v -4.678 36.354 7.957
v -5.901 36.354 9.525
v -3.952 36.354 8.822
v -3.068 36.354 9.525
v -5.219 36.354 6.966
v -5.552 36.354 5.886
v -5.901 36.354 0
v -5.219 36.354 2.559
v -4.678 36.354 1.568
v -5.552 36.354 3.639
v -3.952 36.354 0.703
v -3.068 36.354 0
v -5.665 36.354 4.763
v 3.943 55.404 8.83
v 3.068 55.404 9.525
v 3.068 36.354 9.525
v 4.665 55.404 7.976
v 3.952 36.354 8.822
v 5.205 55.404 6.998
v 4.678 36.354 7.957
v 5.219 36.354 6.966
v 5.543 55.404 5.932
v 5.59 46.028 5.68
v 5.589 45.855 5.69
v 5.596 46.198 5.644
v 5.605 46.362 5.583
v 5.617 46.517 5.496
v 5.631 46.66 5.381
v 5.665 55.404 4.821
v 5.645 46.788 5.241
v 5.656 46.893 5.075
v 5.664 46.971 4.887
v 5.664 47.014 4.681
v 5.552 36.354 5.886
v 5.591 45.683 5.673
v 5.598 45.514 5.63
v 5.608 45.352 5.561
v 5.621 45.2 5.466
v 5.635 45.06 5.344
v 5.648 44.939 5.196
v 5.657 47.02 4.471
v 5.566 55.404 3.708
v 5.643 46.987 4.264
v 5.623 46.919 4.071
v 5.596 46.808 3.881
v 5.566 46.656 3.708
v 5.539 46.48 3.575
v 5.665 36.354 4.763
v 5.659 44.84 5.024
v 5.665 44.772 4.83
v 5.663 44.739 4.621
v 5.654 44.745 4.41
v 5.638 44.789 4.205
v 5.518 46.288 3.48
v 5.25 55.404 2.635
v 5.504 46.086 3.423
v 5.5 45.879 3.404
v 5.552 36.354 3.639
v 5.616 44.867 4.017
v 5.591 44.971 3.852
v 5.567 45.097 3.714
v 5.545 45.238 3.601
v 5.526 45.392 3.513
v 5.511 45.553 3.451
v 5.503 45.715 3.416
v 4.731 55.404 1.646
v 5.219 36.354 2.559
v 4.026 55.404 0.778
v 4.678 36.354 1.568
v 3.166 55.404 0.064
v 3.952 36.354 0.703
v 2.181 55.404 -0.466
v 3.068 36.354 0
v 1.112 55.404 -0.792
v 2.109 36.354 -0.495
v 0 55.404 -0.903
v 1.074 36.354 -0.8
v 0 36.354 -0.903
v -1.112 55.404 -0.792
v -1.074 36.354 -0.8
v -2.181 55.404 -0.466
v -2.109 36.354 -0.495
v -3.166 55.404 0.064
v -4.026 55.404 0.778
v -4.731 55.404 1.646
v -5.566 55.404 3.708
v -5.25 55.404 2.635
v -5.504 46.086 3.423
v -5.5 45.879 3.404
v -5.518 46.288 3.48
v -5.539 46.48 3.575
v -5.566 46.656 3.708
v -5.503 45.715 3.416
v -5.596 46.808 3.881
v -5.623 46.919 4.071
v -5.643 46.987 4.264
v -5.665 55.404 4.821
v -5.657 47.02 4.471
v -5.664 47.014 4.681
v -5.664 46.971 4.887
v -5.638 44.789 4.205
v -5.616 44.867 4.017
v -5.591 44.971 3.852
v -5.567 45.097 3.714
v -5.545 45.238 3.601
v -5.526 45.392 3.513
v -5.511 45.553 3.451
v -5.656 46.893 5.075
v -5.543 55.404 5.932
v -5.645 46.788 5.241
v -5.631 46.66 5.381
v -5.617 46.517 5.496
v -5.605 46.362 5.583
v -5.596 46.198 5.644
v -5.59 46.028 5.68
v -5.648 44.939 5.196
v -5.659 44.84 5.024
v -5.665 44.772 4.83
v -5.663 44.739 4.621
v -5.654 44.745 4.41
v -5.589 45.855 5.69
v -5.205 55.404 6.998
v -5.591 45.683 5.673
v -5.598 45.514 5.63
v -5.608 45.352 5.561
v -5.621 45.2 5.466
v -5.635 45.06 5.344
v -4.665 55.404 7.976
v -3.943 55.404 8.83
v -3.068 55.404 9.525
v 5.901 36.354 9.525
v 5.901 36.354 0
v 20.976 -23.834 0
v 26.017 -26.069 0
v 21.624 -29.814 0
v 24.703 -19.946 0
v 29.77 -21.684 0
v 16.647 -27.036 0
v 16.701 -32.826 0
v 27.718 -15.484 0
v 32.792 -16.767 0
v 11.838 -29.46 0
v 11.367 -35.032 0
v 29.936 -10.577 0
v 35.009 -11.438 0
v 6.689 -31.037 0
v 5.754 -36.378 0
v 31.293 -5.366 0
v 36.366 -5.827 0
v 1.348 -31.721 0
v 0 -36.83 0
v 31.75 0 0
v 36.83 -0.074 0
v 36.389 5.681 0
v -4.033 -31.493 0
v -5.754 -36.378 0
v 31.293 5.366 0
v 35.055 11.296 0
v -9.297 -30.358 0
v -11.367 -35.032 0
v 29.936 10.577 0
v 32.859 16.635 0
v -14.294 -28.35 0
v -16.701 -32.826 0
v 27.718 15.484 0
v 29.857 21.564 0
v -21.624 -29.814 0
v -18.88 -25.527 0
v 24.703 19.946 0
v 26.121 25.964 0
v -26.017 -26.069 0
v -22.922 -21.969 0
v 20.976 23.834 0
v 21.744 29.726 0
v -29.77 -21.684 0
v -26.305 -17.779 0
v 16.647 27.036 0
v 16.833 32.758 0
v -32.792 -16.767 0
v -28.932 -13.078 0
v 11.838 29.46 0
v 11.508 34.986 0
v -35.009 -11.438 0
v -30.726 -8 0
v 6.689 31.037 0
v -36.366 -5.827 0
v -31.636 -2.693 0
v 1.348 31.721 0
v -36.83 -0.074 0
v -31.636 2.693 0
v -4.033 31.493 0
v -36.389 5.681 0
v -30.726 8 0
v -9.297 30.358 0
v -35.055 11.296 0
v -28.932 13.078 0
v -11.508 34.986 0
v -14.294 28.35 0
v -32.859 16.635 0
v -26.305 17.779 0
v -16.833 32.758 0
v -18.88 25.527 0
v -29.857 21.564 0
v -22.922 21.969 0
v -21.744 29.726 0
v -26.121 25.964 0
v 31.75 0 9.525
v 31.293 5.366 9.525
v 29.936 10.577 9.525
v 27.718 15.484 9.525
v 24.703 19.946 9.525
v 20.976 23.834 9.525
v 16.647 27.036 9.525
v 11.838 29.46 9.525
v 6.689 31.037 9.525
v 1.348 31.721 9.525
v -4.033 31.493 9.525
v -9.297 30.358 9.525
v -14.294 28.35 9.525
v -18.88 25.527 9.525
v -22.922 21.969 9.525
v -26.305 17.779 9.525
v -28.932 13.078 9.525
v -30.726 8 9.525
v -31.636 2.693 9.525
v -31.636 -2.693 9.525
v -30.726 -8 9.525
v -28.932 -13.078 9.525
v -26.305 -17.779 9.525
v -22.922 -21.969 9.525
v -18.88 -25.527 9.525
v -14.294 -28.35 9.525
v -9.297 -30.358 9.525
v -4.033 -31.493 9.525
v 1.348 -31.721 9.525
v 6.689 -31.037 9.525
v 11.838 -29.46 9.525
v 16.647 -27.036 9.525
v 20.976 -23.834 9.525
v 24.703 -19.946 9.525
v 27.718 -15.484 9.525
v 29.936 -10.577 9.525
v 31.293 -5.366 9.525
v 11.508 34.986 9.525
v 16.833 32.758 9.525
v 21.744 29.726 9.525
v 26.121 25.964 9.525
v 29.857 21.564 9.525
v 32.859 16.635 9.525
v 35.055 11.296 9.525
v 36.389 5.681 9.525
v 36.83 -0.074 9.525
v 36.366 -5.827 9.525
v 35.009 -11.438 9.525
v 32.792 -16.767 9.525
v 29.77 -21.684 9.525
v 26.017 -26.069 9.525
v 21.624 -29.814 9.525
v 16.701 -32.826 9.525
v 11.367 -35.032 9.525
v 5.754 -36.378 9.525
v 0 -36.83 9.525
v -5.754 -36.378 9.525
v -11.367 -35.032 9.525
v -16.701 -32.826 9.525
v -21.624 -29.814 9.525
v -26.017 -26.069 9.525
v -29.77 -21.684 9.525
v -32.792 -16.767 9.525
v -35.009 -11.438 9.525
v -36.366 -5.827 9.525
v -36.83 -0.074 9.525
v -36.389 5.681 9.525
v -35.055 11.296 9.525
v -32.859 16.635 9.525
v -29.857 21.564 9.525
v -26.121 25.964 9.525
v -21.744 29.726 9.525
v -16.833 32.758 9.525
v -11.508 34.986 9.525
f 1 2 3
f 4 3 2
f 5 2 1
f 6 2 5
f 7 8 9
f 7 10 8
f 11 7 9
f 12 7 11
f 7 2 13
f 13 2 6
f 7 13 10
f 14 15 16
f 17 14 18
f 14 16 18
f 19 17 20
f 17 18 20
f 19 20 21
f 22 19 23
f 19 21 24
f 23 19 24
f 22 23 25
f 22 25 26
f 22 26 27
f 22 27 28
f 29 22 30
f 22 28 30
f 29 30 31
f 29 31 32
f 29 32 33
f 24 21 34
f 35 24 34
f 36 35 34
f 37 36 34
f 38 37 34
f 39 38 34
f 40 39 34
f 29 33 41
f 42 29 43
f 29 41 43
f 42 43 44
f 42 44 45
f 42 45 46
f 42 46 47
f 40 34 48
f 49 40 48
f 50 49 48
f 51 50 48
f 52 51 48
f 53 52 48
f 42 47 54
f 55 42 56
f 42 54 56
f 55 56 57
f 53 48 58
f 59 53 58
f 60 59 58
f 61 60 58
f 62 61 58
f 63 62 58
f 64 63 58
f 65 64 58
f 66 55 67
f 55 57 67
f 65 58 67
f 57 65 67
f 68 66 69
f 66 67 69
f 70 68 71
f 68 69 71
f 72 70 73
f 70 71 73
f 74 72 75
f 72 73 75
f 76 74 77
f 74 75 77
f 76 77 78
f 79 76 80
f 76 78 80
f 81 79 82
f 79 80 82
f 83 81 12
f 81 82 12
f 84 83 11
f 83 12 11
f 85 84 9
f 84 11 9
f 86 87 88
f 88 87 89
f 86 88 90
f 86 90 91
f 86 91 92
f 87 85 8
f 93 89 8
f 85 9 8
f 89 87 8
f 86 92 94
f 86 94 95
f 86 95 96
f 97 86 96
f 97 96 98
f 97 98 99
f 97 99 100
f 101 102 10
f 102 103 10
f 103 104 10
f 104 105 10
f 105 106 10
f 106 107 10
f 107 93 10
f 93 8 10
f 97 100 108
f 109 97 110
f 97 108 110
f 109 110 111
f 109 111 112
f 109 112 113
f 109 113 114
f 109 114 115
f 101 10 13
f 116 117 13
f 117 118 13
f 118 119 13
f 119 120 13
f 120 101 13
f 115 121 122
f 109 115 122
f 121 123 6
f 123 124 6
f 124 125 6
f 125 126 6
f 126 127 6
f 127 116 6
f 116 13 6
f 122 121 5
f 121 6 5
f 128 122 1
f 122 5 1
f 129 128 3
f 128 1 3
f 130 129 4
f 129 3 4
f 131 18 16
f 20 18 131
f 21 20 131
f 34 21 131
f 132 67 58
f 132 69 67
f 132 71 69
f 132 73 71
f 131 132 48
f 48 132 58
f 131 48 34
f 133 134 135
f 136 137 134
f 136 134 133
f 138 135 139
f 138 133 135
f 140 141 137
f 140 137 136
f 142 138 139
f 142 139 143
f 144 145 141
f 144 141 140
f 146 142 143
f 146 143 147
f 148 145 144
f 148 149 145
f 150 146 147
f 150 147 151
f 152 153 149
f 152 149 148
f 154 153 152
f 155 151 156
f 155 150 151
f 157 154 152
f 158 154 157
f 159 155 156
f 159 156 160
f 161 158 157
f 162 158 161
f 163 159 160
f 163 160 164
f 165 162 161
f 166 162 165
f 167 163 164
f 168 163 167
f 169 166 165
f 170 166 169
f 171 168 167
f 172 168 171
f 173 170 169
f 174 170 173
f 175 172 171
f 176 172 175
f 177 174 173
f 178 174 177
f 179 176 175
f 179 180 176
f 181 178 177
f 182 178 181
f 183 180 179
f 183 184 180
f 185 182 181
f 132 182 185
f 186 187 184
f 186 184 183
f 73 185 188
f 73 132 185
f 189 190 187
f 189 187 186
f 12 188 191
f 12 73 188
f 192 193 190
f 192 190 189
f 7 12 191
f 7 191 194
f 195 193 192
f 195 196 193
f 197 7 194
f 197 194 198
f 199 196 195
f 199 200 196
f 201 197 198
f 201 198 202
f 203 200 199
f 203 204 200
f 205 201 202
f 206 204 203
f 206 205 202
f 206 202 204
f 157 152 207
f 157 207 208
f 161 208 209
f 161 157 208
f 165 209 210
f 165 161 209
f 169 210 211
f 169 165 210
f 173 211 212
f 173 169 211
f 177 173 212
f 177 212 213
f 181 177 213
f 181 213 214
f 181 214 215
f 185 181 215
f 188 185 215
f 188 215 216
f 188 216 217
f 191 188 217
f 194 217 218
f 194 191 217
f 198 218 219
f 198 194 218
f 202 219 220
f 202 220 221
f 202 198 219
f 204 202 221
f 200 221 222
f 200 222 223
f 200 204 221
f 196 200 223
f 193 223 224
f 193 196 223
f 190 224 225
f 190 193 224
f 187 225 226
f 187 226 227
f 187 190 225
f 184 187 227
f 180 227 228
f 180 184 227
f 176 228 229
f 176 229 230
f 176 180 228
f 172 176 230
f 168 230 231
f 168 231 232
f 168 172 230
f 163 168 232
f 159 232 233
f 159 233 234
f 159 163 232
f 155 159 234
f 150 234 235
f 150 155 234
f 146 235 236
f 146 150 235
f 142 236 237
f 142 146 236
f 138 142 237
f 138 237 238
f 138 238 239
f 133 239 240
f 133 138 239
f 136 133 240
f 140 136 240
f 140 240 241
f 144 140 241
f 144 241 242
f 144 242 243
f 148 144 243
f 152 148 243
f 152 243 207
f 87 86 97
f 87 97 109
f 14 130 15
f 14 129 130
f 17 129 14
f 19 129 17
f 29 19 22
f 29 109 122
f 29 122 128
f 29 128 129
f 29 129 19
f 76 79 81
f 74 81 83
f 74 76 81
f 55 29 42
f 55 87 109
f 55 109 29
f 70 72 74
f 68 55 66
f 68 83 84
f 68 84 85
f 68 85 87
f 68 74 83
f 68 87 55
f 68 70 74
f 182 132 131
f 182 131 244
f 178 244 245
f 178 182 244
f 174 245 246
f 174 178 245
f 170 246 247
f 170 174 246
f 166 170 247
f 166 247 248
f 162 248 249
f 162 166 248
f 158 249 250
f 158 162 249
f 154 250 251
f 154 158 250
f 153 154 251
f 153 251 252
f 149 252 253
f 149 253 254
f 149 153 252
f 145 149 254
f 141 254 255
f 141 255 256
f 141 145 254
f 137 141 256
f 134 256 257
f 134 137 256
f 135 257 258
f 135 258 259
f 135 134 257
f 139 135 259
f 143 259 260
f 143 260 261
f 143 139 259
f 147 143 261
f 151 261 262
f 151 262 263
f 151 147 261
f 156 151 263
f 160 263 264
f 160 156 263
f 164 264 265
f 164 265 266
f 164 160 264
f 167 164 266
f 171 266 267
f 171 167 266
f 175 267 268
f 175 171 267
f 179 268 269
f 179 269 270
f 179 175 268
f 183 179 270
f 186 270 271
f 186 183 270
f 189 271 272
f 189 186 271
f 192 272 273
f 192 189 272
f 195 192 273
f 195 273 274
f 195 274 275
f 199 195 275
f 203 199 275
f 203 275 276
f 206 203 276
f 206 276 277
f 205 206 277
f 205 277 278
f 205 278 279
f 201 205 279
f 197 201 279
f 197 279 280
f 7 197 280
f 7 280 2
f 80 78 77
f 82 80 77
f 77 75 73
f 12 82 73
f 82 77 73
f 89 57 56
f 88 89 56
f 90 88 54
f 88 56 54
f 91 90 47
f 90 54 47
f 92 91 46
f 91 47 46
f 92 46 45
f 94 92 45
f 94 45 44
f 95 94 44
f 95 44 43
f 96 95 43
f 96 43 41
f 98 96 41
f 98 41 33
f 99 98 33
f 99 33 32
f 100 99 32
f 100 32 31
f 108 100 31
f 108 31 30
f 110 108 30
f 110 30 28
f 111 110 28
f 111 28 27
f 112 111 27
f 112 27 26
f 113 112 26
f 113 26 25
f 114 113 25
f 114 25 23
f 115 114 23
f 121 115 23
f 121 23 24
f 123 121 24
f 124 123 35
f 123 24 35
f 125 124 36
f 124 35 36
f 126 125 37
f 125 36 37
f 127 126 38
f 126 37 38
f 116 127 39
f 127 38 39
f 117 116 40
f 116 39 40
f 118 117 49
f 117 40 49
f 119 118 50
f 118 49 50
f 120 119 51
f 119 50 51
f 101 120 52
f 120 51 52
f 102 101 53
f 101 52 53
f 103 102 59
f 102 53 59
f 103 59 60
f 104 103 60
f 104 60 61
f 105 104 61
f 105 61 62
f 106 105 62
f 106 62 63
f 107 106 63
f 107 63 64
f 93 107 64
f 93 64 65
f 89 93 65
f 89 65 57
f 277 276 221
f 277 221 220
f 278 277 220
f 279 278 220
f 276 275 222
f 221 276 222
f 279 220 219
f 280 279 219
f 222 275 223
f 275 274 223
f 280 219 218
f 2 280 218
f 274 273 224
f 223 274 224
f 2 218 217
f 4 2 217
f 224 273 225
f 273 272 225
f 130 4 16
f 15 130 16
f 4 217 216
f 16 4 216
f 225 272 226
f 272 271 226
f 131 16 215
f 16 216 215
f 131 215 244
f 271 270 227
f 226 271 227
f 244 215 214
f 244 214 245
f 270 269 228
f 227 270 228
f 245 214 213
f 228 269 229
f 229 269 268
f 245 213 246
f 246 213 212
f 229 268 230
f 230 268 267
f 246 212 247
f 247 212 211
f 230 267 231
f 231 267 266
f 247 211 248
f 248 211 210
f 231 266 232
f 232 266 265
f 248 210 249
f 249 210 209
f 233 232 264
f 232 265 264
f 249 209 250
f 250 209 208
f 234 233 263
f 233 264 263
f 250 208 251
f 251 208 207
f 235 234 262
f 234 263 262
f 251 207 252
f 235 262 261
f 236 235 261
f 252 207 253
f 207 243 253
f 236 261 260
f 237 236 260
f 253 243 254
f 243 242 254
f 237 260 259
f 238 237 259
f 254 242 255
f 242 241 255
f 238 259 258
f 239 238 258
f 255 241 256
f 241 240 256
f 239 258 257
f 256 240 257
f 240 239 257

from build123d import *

# Parameters (mm, degrees)
SKETCH1_R           = 31.75
BOSS_EXTRUDE1_DEPTH = 9.525
BOSS_EXTRUDE2_DEPTH = 19.05
SKETCH3_R           = 1.143
CUT_EXTRUDE1_DEPTH  = 43.730618225
SKETCH4_W           = 11.567255286
SKETCH4_H           = 3.936355762
CUT_EXTRUDE2_DEPTH  = 93.234251534


with BuildPart() as part:
    # Sketch1 → Boss-Extrude1 (new body)
    with BuildSketch(Plane.XY):
        with BuildLine():
            Line((-5.900618225, 36.354251534), (5.900618225, 36.354251534))
            ThreePointArc((5.900618225, 36.354251534), (0, -36.83), (-5.900618225, 36.354251534))
        make_face()
        Circle(SKETCH1_R, mode=Mode.SUBTRACT)
    extrude(amount=BOSS_EXTRUDE1_DEPTH)

    # Sketch2 → Boss-Extrude2 (add)
    with BuildSketch(Plane(origin=(0, 36.354251534, 0), x_dir=(1, 0, 0), z_dir=(0, 1, 0))):
        with BuildLine():
            Line((-3.067713808, -9.525), (3.067713808, -9.525))
            ThreePointArc((3.067713808, -9.525), (0, 0.902504348), (-3.067713808, -9.525))
        make_face()
    extrude(amount=BOSS_EXTRUDE2_DEPTH)

    # Sketch3 → Cut-Extrude1 (cut, through all)
    with BuildSketch(Plane(origin=(5.900618225, 0, 0), x_dir=(0, 0, -1), z_dir=(1, 0, 0))):
        with Locations((-4.546893104, 45.879251534)):
            Circle(SKETCH3_R)
    extrude(amount=-CUT_EXTRUDE1_DEPTH, mode=Mode.SUBTRACT)

    # Sketch4 → Cut-Extrude2 (cut, through all)
    with BuildSketch(Plane(origin=(0, 55.404251534, 0), x_dir=(1, 0, 0), z_dir=(0, 1, 0))):
        with Locations((-0.26002139, -11.608026225)):
            Rectangle(SKETCH4_W, SKETCH4_H)
    extrude(amount=-CUT_EXTRUDE2_DEPTH, mode=Mode.SUBTRACT)


solid = part.part
